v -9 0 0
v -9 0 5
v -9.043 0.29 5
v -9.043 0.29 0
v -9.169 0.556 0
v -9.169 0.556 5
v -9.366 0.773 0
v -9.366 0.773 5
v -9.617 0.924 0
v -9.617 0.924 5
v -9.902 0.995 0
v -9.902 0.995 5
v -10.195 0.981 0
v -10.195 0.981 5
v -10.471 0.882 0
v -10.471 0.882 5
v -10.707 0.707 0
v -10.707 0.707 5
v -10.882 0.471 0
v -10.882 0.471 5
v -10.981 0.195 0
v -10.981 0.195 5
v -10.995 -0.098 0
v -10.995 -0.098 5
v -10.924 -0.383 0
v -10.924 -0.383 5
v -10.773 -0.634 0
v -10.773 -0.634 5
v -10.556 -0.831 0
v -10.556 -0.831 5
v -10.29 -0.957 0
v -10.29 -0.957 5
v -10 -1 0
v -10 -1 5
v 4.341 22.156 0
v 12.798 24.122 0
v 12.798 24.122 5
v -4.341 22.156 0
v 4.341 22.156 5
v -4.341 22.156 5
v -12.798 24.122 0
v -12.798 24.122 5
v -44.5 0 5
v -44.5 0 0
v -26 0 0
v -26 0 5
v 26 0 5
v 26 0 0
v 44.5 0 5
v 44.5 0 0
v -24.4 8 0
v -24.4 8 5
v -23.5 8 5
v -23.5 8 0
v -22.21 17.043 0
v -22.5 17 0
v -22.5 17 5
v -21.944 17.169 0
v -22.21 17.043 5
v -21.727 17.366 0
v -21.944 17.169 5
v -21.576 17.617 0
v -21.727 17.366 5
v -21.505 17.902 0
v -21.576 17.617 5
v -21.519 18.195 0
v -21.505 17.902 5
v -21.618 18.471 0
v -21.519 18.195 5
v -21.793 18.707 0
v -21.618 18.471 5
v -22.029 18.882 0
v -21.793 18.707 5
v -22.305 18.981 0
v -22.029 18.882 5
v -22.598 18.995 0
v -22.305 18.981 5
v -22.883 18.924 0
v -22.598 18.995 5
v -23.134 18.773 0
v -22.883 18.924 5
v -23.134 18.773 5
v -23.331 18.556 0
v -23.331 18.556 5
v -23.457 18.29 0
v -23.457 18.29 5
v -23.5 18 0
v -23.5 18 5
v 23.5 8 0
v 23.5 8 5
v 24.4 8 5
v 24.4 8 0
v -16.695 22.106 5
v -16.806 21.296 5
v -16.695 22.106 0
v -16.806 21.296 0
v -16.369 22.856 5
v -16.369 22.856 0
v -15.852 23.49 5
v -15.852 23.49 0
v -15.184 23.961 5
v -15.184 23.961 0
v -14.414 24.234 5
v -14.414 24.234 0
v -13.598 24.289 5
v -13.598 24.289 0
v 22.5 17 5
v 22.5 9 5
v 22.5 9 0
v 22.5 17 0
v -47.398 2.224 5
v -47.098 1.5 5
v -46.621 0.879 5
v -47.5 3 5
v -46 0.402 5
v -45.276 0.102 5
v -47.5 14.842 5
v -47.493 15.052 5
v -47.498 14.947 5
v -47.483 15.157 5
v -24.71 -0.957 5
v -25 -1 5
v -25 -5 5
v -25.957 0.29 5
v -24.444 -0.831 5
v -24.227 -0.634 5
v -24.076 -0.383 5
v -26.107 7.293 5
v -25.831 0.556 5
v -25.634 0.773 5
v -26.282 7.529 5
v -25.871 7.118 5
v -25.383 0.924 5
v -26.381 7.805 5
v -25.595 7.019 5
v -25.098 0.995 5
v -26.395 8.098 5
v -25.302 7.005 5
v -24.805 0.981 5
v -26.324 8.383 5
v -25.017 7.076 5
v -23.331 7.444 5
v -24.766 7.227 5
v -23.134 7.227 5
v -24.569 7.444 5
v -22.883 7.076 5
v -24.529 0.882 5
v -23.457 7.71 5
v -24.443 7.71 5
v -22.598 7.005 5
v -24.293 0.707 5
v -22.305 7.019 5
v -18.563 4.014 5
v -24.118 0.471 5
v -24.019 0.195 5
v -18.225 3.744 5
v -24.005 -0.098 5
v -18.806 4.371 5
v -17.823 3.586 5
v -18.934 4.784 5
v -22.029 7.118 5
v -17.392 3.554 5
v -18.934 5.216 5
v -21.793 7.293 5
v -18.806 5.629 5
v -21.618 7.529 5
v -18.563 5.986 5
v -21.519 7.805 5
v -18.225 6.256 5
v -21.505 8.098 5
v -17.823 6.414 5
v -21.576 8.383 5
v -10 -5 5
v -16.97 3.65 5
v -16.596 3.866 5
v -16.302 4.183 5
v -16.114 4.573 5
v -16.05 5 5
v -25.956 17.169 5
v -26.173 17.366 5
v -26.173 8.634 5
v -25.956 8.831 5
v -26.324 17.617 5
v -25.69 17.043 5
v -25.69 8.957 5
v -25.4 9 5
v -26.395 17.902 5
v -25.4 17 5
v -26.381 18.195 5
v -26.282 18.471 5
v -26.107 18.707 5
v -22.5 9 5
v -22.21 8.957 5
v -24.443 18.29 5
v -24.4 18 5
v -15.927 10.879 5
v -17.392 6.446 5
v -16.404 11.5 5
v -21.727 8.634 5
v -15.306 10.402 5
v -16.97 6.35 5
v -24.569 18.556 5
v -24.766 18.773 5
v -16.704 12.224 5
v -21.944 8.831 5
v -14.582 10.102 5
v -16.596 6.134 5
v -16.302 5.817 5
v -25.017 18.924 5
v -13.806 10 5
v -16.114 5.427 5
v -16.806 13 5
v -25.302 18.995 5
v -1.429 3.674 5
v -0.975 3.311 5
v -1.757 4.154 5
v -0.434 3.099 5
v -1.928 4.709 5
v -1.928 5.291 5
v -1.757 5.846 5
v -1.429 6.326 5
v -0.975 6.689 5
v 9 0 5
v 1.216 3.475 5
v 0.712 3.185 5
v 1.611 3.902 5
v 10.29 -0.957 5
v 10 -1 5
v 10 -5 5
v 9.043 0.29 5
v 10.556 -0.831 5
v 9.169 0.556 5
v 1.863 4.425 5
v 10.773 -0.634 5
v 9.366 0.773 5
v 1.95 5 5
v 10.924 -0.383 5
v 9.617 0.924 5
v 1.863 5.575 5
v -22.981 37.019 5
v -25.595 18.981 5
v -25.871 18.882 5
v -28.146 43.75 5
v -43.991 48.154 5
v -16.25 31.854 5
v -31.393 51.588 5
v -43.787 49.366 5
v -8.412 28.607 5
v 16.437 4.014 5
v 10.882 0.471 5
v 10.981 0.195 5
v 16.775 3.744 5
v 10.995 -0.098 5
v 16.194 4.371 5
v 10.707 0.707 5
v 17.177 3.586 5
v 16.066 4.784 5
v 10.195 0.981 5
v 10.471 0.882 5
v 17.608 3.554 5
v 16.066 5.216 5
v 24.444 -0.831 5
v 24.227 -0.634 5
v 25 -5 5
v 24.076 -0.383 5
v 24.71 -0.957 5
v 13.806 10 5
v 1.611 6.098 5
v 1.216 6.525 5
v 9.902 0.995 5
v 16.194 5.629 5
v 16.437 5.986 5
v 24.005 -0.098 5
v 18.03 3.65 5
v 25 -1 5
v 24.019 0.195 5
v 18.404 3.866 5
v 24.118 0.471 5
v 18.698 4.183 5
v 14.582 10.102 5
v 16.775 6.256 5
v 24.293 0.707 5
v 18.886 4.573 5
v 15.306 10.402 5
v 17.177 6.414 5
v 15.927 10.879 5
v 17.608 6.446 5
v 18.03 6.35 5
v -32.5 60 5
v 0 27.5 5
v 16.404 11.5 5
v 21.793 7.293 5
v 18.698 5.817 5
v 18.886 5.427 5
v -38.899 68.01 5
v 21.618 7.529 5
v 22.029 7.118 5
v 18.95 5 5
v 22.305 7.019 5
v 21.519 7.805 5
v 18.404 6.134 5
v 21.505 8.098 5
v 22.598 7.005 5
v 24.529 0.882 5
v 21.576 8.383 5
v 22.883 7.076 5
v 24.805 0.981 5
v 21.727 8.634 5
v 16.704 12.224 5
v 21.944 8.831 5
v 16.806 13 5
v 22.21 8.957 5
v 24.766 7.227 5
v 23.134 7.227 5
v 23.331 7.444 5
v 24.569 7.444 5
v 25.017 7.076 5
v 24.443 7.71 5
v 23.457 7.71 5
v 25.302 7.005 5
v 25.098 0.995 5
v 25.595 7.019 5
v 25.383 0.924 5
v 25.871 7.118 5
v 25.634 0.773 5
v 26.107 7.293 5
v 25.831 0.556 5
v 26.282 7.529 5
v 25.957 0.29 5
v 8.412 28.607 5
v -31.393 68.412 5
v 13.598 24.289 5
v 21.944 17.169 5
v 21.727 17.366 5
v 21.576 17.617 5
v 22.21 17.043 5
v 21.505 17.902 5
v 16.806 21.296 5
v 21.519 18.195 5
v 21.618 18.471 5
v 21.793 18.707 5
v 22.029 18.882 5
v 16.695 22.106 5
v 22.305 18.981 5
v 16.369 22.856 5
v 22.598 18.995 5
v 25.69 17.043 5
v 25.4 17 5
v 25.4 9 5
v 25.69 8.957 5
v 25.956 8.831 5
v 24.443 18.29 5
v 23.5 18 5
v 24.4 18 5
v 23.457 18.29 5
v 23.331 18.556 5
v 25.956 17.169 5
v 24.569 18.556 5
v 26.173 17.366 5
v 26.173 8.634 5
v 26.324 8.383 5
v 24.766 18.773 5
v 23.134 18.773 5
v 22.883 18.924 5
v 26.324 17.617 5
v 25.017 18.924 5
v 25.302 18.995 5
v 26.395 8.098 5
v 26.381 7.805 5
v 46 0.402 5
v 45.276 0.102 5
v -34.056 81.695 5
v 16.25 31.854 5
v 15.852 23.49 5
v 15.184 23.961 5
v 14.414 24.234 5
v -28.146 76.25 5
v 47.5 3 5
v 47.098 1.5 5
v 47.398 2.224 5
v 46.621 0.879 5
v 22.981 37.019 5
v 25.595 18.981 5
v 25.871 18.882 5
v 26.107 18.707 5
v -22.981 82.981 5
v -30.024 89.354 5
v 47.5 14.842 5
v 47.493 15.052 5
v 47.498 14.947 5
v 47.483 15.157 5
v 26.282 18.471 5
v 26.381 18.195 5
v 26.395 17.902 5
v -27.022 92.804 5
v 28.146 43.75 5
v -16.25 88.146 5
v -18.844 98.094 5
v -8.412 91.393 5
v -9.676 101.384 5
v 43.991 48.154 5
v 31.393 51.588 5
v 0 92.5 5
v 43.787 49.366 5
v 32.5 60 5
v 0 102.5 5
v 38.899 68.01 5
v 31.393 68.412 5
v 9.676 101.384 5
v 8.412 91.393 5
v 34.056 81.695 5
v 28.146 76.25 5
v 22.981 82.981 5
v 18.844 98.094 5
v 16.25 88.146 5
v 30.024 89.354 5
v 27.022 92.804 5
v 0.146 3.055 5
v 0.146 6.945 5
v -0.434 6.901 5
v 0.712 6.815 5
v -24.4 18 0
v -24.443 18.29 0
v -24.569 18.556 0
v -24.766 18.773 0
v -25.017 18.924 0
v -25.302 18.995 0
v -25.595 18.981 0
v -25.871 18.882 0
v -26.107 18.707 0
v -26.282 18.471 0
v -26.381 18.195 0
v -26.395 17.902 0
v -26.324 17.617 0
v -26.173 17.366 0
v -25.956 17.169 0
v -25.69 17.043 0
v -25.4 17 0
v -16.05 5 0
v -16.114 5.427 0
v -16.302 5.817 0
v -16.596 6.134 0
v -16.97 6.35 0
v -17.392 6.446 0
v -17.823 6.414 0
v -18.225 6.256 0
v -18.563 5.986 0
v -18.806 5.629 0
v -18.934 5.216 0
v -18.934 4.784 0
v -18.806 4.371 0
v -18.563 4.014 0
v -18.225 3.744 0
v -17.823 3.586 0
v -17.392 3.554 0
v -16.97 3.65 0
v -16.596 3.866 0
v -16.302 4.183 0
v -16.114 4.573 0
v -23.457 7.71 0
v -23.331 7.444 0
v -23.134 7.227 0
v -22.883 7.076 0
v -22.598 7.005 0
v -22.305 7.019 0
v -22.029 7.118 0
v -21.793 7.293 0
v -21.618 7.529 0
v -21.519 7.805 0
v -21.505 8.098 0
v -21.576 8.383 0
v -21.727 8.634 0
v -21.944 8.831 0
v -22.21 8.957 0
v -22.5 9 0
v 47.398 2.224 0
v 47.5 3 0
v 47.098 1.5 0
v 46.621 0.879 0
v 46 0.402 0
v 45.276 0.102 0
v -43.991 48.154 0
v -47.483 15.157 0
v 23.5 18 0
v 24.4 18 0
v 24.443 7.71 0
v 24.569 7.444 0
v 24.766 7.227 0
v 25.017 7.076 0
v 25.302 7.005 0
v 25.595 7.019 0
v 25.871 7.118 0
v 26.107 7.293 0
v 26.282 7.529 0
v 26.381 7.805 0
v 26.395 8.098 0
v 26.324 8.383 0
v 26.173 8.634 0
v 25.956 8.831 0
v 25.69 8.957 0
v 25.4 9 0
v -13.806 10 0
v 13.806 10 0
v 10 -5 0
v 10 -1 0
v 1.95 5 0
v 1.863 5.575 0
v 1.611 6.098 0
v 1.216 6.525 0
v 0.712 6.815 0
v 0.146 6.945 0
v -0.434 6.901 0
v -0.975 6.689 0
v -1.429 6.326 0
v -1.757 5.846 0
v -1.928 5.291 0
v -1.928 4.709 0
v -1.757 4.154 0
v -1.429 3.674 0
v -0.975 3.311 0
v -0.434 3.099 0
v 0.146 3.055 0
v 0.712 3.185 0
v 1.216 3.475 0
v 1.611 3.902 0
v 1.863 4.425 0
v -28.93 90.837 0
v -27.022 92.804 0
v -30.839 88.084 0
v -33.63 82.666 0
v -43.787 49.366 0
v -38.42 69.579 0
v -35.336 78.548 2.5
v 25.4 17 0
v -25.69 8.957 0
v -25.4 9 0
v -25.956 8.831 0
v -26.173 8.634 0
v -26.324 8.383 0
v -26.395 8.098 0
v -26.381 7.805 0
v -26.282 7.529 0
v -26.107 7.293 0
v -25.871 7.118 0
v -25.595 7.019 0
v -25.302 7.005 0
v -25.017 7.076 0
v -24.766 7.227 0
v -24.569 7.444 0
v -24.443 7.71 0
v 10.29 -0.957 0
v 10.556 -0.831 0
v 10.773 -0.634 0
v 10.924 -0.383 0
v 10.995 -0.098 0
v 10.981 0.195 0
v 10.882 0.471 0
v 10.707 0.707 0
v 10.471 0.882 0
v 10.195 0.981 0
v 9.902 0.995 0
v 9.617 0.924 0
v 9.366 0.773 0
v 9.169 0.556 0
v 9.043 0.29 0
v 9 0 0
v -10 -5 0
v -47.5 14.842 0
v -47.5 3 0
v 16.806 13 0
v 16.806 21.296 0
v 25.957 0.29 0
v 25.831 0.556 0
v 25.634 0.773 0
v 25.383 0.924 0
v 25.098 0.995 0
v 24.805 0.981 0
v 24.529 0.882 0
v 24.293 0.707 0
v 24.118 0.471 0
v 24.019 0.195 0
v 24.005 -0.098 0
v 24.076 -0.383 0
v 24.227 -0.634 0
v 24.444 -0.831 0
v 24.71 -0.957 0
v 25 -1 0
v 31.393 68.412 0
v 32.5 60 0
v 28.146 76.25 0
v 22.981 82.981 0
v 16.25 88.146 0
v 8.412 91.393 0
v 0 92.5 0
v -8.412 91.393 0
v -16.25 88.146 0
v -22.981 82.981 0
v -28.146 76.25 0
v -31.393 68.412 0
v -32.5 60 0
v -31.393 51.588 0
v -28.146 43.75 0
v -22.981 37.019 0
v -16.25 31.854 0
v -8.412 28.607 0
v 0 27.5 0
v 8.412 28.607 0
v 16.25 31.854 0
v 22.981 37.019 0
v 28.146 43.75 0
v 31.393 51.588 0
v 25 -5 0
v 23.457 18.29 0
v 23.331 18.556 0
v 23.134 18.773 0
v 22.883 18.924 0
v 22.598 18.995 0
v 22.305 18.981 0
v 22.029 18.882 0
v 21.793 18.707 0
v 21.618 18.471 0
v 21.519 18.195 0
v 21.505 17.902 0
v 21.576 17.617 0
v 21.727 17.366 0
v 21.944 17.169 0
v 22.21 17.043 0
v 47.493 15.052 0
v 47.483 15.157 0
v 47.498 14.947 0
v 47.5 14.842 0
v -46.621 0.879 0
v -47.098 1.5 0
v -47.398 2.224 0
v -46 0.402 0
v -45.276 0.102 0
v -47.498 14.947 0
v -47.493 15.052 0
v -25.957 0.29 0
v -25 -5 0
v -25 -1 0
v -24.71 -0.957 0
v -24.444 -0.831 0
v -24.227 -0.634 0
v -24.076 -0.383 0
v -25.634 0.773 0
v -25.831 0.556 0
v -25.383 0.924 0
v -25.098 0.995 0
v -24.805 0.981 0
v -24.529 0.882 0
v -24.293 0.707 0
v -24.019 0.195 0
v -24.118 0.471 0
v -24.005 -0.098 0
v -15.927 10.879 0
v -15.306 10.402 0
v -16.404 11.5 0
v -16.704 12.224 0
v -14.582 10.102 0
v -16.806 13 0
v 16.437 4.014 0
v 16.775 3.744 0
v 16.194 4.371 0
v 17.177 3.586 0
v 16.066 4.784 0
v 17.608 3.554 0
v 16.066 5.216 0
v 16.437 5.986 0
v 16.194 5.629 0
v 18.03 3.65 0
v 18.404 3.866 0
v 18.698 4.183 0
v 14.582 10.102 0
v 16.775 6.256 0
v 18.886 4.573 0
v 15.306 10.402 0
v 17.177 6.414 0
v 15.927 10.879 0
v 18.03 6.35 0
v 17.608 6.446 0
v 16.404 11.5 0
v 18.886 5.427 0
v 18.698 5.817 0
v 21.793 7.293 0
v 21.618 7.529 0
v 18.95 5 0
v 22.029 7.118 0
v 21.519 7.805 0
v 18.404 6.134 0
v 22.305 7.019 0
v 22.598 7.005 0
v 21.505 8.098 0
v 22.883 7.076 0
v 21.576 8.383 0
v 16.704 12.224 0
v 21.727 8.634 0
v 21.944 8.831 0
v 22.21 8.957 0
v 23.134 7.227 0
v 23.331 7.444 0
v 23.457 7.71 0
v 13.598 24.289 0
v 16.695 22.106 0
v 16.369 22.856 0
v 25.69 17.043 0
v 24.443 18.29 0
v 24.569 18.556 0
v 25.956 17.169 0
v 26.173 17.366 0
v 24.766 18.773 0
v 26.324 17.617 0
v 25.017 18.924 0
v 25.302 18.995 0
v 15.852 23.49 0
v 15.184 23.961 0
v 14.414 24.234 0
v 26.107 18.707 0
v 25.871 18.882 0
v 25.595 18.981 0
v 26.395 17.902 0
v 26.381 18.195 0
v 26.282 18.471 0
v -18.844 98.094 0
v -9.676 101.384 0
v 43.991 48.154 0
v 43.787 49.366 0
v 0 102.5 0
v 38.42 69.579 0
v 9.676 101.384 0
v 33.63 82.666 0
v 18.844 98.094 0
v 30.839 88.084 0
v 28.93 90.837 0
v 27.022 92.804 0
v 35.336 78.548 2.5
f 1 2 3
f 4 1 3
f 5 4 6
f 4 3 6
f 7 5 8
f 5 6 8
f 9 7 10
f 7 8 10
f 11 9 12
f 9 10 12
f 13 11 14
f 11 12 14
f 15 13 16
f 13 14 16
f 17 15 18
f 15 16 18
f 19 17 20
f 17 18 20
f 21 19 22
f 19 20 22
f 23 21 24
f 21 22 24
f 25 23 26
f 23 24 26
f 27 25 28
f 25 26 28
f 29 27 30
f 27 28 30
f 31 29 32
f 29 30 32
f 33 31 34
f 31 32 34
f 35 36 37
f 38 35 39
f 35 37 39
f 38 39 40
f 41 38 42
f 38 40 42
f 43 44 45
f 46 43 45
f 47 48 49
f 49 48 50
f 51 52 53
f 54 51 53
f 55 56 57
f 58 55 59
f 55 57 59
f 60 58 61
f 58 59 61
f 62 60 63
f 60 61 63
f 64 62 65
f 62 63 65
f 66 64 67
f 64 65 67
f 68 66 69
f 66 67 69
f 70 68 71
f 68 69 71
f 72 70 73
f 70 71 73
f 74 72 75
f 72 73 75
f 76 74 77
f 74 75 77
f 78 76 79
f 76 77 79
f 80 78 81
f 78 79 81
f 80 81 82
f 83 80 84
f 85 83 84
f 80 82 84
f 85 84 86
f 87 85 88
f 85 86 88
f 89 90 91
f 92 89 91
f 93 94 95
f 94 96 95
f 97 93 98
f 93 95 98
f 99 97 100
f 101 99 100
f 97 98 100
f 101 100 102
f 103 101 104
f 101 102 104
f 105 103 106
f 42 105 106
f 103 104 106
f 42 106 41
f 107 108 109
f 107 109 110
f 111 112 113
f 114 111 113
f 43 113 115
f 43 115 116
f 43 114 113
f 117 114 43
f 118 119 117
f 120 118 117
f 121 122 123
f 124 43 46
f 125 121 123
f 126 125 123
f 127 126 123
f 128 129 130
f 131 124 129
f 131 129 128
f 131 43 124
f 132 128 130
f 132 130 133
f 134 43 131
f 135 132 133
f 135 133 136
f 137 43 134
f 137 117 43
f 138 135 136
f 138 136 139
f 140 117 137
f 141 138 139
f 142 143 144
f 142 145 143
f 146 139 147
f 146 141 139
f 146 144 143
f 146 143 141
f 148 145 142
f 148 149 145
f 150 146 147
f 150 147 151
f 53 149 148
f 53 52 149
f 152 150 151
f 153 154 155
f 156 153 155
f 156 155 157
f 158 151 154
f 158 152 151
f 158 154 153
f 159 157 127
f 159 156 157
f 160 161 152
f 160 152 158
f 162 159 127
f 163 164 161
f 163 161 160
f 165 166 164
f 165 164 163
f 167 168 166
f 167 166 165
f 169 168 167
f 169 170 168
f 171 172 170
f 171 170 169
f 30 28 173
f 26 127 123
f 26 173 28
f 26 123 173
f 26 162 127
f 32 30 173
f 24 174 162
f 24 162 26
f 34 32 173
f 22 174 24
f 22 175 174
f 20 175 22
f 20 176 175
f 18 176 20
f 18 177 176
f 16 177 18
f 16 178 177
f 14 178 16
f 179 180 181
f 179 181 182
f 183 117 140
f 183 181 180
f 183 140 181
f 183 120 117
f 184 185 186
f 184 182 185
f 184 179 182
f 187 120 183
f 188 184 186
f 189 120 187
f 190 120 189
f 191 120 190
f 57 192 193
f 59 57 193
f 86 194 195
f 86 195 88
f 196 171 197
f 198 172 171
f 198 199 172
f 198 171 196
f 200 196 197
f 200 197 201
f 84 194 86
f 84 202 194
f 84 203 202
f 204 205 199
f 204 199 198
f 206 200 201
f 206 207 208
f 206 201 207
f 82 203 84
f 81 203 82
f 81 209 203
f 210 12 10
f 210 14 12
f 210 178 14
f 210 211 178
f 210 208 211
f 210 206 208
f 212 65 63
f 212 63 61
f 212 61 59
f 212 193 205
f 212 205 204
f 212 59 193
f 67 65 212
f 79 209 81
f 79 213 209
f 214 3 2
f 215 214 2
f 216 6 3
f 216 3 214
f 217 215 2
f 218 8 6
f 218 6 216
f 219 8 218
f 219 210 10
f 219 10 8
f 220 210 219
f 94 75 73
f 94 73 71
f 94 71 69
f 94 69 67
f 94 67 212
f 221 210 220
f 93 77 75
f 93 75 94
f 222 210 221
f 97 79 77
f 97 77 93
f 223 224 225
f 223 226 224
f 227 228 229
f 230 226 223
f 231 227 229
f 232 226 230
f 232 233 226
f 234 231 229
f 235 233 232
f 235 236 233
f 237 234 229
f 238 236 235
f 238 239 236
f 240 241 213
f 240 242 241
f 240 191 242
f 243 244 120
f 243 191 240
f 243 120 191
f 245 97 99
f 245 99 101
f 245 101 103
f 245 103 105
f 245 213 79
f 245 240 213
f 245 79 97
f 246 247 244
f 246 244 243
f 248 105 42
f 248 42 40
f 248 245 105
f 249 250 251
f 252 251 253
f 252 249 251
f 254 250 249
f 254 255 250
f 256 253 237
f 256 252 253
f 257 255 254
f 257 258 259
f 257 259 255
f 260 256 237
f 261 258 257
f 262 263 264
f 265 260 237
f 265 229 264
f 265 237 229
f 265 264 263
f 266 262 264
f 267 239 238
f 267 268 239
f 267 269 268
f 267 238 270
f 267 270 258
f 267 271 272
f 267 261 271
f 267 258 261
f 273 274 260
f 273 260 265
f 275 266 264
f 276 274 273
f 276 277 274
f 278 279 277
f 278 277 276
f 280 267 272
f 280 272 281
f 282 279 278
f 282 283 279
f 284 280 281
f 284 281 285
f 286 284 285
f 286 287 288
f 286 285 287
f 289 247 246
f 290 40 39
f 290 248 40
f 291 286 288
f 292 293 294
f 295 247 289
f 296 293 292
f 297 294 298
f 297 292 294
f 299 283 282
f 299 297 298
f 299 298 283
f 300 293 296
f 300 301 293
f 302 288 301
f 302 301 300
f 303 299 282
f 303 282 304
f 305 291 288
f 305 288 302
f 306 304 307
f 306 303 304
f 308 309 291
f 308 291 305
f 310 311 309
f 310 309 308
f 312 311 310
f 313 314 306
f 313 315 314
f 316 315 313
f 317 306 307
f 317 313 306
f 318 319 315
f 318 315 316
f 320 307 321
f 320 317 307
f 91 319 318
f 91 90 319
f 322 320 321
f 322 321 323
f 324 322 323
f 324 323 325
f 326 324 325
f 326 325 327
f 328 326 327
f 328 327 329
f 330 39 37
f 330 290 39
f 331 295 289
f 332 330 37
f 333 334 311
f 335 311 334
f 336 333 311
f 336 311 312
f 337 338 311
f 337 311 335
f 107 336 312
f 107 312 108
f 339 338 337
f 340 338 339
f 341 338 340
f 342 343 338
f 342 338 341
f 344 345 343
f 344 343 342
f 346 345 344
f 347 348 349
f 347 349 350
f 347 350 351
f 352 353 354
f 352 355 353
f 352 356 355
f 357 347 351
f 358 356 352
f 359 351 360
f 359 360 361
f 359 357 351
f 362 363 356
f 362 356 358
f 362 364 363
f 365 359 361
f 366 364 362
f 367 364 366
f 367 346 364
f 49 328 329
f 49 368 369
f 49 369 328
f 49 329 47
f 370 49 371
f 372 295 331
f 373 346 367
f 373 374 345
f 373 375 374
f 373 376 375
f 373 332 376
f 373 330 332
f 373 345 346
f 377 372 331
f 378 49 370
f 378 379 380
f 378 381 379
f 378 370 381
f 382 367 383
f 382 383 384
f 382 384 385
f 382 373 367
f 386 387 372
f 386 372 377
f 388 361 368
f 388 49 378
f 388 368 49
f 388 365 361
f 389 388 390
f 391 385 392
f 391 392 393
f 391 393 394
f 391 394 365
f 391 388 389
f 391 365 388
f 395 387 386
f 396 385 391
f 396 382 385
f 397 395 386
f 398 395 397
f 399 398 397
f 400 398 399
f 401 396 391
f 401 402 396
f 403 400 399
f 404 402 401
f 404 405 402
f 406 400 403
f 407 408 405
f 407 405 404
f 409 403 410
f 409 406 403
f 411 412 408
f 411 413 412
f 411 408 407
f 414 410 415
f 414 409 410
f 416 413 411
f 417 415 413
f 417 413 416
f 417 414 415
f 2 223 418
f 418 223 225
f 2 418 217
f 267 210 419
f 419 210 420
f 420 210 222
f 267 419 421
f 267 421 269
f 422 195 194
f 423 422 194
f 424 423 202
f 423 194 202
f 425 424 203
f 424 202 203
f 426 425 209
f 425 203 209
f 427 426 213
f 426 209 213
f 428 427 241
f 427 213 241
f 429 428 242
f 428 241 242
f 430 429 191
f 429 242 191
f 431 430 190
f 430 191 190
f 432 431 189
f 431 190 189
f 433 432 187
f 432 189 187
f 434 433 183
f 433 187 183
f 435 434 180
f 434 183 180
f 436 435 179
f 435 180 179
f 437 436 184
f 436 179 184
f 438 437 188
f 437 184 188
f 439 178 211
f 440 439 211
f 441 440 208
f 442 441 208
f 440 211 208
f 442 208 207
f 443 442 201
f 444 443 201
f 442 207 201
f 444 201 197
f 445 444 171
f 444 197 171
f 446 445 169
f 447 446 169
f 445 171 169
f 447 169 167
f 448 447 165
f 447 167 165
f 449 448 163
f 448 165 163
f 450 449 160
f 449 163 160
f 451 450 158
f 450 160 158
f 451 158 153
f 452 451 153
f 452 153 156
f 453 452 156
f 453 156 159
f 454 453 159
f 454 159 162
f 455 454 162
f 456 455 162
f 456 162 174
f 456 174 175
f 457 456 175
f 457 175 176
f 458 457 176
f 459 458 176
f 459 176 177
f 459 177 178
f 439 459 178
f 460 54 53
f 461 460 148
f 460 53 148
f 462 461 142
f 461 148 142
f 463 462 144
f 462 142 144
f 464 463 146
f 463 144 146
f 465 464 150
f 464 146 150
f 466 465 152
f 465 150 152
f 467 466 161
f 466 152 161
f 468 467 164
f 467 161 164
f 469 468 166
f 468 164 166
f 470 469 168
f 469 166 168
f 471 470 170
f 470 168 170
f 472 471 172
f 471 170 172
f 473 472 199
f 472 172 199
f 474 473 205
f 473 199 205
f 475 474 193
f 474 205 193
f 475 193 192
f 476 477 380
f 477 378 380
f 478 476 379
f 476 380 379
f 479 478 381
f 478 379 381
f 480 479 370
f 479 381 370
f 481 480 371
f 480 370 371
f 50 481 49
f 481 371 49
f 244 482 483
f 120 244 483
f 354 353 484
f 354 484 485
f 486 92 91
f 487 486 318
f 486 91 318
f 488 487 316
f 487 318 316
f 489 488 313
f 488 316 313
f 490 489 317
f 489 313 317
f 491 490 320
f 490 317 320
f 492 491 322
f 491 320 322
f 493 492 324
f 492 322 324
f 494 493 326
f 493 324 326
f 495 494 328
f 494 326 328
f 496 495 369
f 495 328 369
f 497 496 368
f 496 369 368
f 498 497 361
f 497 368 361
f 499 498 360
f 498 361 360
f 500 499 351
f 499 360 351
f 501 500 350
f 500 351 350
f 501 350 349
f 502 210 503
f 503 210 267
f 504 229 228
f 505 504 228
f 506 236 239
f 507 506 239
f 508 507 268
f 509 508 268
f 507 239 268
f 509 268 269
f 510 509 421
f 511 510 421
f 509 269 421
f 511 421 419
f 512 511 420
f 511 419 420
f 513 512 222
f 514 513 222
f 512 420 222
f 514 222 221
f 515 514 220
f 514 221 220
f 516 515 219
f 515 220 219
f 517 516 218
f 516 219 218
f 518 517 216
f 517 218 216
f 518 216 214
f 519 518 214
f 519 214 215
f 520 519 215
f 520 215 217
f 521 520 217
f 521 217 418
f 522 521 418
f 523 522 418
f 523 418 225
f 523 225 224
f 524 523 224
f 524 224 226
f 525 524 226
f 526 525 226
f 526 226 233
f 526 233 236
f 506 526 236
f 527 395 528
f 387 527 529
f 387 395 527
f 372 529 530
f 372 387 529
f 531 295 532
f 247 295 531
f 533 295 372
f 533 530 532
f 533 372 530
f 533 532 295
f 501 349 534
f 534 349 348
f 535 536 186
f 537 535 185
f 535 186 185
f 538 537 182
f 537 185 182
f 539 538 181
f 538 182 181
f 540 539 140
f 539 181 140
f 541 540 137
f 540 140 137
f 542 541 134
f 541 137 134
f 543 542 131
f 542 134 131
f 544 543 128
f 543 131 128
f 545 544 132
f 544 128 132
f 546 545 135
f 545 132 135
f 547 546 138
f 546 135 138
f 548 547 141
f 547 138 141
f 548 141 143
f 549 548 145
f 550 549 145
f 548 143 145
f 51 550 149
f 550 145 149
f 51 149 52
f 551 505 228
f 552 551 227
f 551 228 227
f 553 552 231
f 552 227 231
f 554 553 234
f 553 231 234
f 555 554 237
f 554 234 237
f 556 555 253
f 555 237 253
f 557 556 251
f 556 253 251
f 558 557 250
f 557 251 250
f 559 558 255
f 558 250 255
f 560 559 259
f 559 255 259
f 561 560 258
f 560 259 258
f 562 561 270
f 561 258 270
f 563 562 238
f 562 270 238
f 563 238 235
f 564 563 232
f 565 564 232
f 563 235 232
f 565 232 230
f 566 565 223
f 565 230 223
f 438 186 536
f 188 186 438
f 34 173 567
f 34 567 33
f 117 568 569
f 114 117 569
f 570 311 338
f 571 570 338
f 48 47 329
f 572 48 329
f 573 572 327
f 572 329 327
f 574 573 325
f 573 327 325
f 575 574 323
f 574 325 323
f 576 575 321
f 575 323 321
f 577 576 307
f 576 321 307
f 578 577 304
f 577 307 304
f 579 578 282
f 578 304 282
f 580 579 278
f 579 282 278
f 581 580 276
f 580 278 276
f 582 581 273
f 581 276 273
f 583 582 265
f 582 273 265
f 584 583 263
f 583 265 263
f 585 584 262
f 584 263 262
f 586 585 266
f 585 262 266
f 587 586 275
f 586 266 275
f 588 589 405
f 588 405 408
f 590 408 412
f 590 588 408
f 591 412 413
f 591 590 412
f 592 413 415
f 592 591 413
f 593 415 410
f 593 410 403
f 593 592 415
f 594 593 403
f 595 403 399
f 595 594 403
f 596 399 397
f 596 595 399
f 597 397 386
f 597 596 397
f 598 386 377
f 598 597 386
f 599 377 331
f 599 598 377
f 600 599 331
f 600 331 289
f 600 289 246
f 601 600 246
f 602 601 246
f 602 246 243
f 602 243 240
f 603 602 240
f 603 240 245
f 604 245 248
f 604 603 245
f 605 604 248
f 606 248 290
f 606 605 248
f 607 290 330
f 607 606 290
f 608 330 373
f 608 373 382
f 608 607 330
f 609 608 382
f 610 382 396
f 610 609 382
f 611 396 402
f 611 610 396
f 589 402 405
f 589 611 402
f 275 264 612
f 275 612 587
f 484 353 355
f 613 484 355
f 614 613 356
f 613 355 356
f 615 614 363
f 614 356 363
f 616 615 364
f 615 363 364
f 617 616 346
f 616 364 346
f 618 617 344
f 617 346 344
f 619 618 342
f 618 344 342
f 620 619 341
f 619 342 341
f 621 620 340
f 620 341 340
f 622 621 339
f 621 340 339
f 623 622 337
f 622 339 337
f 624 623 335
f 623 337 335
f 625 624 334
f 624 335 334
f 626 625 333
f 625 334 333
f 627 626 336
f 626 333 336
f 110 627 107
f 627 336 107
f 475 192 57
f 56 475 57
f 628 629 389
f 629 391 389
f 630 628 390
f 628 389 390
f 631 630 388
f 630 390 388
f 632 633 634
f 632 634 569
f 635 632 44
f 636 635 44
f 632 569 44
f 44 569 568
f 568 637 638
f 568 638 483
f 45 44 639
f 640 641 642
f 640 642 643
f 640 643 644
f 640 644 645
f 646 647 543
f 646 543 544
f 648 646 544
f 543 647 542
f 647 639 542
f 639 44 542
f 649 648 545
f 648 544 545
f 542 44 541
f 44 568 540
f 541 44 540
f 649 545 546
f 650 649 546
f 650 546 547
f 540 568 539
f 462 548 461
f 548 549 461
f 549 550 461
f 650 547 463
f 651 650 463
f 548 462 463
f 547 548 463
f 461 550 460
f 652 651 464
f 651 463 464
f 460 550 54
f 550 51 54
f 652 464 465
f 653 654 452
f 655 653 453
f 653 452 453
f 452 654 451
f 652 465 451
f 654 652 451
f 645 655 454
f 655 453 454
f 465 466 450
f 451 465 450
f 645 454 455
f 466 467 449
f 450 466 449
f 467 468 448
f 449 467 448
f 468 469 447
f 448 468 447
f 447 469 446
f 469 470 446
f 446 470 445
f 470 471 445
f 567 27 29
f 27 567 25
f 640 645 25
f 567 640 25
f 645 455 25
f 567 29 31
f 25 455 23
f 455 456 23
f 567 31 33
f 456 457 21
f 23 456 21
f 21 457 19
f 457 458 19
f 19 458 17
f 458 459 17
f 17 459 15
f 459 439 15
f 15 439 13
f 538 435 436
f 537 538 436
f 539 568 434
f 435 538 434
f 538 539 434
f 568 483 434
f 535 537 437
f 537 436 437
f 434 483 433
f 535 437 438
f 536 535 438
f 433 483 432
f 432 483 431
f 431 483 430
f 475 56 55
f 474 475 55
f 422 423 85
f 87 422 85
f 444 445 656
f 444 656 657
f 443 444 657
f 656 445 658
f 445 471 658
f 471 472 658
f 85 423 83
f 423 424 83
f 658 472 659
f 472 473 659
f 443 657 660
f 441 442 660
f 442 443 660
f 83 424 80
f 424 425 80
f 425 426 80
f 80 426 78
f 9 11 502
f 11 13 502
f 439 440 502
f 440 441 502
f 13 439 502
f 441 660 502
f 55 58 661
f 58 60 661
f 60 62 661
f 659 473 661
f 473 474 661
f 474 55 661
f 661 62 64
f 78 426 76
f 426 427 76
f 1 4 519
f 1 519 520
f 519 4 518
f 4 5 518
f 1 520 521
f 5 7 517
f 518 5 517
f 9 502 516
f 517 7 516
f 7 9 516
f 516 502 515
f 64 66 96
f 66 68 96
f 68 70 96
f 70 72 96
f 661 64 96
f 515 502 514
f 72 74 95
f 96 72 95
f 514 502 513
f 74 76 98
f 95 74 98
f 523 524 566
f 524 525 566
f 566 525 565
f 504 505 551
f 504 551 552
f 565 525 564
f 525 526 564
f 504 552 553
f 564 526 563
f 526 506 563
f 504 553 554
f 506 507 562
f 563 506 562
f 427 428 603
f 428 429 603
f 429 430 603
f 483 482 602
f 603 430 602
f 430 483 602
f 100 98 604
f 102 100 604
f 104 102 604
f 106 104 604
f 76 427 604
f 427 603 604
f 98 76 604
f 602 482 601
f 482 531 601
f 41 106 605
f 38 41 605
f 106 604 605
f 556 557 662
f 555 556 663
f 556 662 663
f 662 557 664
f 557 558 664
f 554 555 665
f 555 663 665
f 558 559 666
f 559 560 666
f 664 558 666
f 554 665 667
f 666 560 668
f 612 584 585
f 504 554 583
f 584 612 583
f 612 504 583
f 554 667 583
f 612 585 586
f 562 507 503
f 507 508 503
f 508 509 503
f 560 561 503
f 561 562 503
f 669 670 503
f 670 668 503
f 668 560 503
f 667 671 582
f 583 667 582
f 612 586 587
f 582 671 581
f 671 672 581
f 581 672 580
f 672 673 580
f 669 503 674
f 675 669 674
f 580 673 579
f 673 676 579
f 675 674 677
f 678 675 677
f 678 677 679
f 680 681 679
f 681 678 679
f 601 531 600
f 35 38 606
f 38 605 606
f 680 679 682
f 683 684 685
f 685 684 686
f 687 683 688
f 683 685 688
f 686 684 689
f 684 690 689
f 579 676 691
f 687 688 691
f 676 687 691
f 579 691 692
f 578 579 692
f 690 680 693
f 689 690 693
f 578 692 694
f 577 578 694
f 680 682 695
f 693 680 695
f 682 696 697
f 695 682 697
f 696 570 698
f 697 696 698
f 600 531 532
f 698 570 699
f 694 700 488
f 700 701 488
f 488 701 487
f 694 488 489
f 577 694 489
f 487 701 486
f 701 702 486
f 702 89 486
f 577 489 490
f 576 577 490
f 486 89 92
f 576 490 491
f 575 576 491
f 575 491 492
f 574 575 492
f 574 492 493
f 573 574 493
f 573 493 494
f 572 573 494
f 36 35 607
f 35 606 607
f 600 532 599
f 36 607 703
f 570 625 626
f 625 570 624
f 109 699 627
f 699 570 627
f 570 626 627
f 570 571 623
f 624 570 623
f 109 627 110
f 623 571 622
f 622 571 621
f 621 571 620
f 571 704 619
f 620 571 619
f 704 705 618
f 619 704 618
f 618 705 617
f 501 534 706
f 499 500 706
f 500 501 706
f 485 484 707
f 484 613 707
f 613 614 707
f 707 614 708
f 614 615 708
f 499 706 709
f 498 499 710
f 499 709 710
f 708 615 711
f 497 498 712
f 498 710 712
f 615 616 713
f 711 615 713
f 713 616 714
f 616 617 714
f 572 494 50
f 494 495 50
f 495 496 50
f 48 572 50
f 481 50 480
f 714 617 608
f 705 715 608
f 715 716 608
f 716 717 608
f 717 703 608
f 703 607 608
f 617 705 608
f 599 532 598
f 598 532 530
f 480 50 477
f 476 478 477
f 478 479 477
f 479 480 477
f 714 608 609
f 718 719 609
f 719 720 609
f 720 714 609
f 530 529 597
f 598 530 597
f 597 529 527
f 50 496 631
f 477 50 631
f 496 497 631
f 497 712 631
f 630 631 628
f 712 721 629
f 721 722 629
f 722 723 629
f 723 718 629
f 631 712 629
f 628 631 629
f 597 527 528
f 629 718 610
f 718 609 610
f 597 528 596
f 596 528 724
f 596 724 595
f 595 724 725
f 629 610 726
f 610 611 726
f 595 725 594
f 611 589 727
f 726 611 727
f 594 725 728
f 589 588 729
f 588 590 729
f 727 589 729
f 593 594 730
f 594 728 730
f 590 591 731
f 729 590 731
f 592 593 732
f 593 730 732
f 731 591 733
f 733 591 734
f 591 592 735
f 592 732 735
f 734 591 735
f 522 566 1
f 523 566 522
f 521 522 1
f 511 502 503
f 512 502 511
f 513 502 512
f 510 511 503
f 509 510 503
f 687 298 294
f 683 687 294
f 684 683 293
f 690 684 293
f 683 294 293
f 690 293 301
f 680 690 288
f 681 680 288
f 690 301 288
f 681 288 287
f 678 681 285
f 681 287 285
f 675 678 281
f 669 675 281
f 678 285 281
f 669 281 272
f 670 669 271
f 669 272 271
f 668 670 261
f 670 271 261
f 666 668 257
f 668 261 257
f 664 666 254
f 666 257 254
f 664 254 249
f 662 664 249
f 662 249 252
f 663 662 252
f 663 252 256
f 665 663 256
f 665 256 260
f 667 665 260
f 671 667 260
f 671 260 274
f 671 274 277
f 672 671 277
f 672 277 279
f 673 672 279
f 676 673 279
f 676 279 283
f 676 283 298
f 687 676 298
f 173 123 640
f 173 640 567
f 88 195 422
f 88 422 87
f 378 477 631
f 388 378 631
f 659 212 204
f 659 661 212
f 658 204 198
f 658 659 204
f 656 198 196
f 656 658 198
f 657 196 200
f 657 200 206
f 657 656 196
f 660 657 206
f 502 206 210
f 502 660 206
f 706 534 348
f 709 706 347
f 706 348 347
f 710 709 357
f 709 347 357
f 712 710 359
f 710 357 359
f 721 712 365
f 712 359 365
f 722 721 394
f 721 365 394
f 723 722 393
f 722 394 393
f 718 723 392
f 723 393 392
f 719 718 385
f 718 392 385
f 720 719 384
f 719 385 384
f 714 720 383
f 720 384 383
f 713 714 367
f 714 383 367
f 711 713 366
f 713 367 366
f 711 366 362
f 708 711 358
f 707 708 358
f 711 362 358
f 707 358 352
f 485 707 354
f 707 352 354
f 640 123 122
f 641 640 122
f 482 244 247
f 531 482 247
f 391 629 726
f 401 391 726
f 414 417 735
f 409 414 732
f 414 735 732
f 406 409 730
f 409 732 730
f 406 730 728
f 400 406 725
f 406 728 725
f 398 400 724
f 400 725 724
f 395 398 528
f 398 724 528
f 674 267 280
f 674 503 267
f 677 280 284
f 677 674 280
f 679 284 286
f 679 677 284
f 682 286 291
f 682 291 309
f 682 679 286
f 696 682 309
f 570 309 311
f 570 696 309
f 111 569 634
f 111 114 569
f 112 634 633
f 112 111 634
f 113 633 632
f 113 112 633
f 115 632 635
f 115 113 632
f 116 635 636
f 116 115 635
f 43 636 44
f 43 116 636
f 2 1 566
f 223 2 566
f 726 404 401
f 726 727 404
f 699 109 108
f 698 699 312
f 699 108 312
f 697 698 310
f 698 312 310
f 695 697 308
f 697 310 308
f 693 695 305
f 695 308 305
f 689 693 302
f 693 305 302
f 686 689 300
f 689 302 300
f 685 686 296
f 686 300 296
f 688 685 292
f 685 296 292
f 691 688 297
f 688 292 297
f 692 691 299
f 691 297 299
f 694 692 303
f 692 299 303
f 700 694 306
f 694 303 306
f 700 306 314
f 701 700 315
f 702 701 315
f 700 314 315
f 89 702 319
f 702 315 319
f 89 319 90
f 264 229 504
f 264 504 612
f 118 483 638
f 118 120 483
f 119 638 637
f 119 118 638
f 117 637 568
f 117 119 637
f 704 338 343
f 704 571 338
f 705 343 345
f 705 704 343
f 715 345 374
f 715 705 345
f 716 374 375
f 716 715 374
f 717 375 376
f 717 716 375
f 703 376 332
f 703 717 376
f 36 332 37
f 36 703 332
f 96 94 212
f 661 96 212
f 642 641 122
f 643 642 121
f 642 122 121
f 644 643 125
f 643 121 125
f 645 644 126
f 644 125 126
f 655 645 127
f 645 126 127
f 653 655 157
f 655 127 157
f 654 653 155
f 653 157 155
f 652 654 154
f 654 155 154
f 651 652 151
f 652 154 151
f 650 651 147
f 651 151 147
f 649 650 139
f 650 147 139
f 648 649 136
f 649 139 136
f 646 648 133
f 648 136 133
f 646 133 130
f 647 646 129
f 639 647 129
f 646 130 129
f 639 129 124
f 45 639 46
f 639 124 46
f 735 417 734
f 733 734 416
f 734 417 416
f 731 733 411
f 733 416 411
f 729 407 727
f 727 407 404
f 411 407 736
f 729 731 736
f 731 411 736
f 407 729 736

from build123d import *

# Parameters (mm, degrees)
SKETCH_1_R          = 32.5
EXTRUDE_1_DEPTH     = 5
SKETCH_2_W          = 15
SKETCH_2_H          = 5
EXTRUDE_2_DEPTH     = 5
SKETCH_3_R          = 1
CUT_EXTRUDE_1_DEPTH = 114.081828779
SKETCH_4_R          = 1.95
SKETCH_4_R_2        = 1.45
CUT_EXTRUDE_2_DEPTH = 114.081828779
FILLET_1_R          = 3
SKETCH_5_W          = 2.9
SKETCH_5_H          = 10
CUT_EXTRUDE_3_DEPTH = 114.081828779
SKETCH_6_R          = 1
CUT_EXTRUDE_4_DEPTH = 114.081828779
CUT_EXTRUDE_5_DEPTH = 114.081828779
FILLET_3_R          = 10
FILLET_4_R          = 3


with BuildPart() as part:
    # Sketch 1 → Extrude 1 (new body)
    with BuildSketch(Plane.XY):
        with BuildLine():
            Line((-42.263952975, 64.473061473), (-47.5, 15))
            Line((-47.5, 15), (-47.5, 0))
            Line((-47.5, 0), (47.5, 0))
            Line((47.5, 0), (47.5, 15))
            Line((47.5, 15), (42.263952975, 64.473061473))
            ThreePointArc((42.263952975, 64.473061473), (0, 102.5), (-42.263952975, 64.473061473))
        make_face()
        with Locations((0, 60)):
            Circle(SKETCH_1_R, mode=Mode.SUBTRACT)
    extrude(amount=EXTRUDE_1_DEPTH)

    # Sketch 2 → Extrude 2 (add)
    with BuildSketch(Plane.XY.offset(5)):
        with Locations((-17.5, -2.5)):
            Rectangle(SKETCH_2_W, SKETCH_2_H)
        with Locations((17.5, -2.5)):
            Rectangle(SKETCH_2_W, SKETCH_2_H)
    extrude(amount=-EXTRUDE_2_DEPTH)

    # Sketch 3 → Cut-Extrude 1 (cut, through all)
    with BuildSketch(Plane.XY.offset(5)):
        with Locations((-25, 0)):
            Circle(SKETCH_3_R)
        with Locations((-10, 0)):
            Circle(SKETCH_3_R)
        with Locations((10, 0)):
            Circle(SKETCH_3_R)
        with Locations((25, 0)):
            Circle(SKETCH_3_R)
    extrude(amount=-CUT_EXTRUDE_1_DEPTH, mode=Mode.SUBTRACT)

    # Sketch 4 → Cut-Extrude 2 (cut, through all)
    with BuildSketch(Plane.XY.offset(5)):
        with Locations((0, 5)):
            Circle(SKETCH_4_R)
        with Locations((-17.5, 5)):
            Circle(SKETCH_4_R_2)
        with Locations((17.5, 5)):
            Circle(SKETCH_4_R_2)
    extrude(amount=-CUT_EXTRUDE_2_DEPTH, mode=Mode.SUBTRACT)

    # Fillet 1
    fillet_1_edges = [part.edges().sort_by_distance(p)[0] for p in [
        (47.5, 15, 2.5),
        (47.5, 0, 2.5),
        (-47.5, 0, 2.5),
        (-47.5, 15, 2.5),
    ]]
    fillet(fillet_1_edges, radius=FILLET_1_R)

    # Sketch 5 → Cut-Extrude 3 (cut, through all)
    with BuildSketch(Plane.XY.offset(5)):
        with Locations((-23.95, 13)):
            Rectangle(SKETCH_5_W, SKETCH_5_H)
        with Locations((23.95, 13)):
            Rectangle(SKETCH_5_W, SKETCH_5_H)
    extrude(amount=-CUT_EXTRUDE_3_DEPTH, mode=Mode.SUBTRACT)

    # Sketch 6 → Cut-Extrude 4 (cut, through all)
    with BuildSketch(Plane.XY.offset(5)):
        with Locations((-25.4, 18)):
            Circle(SKETCH_6_R)
        with Locations((-22.5, 18)):
            Circle(SKETCH_6_R)
        with Locations((-22.5, 8)):
            Circle(SKETCH_6_R)
        with Locations((-25.4, 8)):
            Circle(SKETCH_6_R)
        with Locations((22.5, 18)):
            Circle(SKETCH_6_R)
        with Locations((25.4, 18)):
            Circle(SKETCH_6_R)
        with Locations((25.4, 8)):
            Circle(SKETCH_6_R)
        with Locations((22.5, 8)):
            Circle(SKETCH_6_R)
    extrude(amount=-CUT_EXTRUDE_4_DEPTH, mode=Mode.SUBTRACT)

    # Sketch 7 → Cut-Extrude 5 (cut, through all)
    with BuildSketch(Plane.XY.offset(5)):
        with BuildLine():
            Line((-16.805922522, 25.815370212), (-16.805922522, 9.999999776))
            Line((-16.805922522, 9.999999776), (16.805922522, 9.999999776))
            Line((16.805922522, 9.999999776), (16.805922522, 25.815370212))
            ThreePointArc((16.805922522, 25.815370212), (0, 21.907639276), (-16.805922522, 25.815370212))
        make_face()
        with BuildLine():
            Line((-46.54378056, 48.762700401), (-46.54378056, 92.803684493))
            Line((-46.54378056, 92.803684493), (-27.021626223, 92.803684493))
            add(Edge.make_bspline(
                [(-27.021626223, 92.803684493), (-35.335790396, 85.954995386), (-43.926679859, 48.762700401)],
                knots=[0, 0, 0, 1, 1, 1], degree=2))
            Line((-43.926679859, 48.762700401), (-46.54378056, 48.762700401))
        make_face()
        with BuildLine():
            Line((46.54378056, 92.803684493), (27.021626223, 92.803684493))
            add(Edge.make_bspline(
                [(27.021626223, 92.803684493), (35.335790396, 85.954995386), (43.926679859, 48.762700401)],
                knots=[0, 0, 0, 1, 1, 1], degree=2))
            Line((43.926679859, 48.762700401), (46.54378056, 48.762700401))
            Line((46.54378056, 48.762700401), (46.54378056, 92.803684493))
        make_face()
    extrude(amount=-CUT_EXTRUDE_5_DEPTH, mode=Mode.SUBTRACT)

    # Fillet 3
    fillet_3_edges = [part.edges().sort_by_distance(p)[0] for p in [
        (-43.926679859, 48.762700401, 2.5),
        (43.926679859, 48.762700401, 2.5),
    ]]
    fillet(fillet_3_edges, radius=FILLET_3_R)

    # Fillet 4
    fillet_4_edges = [part.edges().sort_by_distance(p)[0] for p in [
        (-16.805922522, 25.815370212, 2.5),
        (16.805922522, 25.815370212, 2.5),
        (16.805922522, 9.999999776, 2.5),
        (-16.805922522, 9.999999776, 2.5),
    ]]
    fillet(fillet_4_edges, radius=FILLET_4_R)


solid = part.part
